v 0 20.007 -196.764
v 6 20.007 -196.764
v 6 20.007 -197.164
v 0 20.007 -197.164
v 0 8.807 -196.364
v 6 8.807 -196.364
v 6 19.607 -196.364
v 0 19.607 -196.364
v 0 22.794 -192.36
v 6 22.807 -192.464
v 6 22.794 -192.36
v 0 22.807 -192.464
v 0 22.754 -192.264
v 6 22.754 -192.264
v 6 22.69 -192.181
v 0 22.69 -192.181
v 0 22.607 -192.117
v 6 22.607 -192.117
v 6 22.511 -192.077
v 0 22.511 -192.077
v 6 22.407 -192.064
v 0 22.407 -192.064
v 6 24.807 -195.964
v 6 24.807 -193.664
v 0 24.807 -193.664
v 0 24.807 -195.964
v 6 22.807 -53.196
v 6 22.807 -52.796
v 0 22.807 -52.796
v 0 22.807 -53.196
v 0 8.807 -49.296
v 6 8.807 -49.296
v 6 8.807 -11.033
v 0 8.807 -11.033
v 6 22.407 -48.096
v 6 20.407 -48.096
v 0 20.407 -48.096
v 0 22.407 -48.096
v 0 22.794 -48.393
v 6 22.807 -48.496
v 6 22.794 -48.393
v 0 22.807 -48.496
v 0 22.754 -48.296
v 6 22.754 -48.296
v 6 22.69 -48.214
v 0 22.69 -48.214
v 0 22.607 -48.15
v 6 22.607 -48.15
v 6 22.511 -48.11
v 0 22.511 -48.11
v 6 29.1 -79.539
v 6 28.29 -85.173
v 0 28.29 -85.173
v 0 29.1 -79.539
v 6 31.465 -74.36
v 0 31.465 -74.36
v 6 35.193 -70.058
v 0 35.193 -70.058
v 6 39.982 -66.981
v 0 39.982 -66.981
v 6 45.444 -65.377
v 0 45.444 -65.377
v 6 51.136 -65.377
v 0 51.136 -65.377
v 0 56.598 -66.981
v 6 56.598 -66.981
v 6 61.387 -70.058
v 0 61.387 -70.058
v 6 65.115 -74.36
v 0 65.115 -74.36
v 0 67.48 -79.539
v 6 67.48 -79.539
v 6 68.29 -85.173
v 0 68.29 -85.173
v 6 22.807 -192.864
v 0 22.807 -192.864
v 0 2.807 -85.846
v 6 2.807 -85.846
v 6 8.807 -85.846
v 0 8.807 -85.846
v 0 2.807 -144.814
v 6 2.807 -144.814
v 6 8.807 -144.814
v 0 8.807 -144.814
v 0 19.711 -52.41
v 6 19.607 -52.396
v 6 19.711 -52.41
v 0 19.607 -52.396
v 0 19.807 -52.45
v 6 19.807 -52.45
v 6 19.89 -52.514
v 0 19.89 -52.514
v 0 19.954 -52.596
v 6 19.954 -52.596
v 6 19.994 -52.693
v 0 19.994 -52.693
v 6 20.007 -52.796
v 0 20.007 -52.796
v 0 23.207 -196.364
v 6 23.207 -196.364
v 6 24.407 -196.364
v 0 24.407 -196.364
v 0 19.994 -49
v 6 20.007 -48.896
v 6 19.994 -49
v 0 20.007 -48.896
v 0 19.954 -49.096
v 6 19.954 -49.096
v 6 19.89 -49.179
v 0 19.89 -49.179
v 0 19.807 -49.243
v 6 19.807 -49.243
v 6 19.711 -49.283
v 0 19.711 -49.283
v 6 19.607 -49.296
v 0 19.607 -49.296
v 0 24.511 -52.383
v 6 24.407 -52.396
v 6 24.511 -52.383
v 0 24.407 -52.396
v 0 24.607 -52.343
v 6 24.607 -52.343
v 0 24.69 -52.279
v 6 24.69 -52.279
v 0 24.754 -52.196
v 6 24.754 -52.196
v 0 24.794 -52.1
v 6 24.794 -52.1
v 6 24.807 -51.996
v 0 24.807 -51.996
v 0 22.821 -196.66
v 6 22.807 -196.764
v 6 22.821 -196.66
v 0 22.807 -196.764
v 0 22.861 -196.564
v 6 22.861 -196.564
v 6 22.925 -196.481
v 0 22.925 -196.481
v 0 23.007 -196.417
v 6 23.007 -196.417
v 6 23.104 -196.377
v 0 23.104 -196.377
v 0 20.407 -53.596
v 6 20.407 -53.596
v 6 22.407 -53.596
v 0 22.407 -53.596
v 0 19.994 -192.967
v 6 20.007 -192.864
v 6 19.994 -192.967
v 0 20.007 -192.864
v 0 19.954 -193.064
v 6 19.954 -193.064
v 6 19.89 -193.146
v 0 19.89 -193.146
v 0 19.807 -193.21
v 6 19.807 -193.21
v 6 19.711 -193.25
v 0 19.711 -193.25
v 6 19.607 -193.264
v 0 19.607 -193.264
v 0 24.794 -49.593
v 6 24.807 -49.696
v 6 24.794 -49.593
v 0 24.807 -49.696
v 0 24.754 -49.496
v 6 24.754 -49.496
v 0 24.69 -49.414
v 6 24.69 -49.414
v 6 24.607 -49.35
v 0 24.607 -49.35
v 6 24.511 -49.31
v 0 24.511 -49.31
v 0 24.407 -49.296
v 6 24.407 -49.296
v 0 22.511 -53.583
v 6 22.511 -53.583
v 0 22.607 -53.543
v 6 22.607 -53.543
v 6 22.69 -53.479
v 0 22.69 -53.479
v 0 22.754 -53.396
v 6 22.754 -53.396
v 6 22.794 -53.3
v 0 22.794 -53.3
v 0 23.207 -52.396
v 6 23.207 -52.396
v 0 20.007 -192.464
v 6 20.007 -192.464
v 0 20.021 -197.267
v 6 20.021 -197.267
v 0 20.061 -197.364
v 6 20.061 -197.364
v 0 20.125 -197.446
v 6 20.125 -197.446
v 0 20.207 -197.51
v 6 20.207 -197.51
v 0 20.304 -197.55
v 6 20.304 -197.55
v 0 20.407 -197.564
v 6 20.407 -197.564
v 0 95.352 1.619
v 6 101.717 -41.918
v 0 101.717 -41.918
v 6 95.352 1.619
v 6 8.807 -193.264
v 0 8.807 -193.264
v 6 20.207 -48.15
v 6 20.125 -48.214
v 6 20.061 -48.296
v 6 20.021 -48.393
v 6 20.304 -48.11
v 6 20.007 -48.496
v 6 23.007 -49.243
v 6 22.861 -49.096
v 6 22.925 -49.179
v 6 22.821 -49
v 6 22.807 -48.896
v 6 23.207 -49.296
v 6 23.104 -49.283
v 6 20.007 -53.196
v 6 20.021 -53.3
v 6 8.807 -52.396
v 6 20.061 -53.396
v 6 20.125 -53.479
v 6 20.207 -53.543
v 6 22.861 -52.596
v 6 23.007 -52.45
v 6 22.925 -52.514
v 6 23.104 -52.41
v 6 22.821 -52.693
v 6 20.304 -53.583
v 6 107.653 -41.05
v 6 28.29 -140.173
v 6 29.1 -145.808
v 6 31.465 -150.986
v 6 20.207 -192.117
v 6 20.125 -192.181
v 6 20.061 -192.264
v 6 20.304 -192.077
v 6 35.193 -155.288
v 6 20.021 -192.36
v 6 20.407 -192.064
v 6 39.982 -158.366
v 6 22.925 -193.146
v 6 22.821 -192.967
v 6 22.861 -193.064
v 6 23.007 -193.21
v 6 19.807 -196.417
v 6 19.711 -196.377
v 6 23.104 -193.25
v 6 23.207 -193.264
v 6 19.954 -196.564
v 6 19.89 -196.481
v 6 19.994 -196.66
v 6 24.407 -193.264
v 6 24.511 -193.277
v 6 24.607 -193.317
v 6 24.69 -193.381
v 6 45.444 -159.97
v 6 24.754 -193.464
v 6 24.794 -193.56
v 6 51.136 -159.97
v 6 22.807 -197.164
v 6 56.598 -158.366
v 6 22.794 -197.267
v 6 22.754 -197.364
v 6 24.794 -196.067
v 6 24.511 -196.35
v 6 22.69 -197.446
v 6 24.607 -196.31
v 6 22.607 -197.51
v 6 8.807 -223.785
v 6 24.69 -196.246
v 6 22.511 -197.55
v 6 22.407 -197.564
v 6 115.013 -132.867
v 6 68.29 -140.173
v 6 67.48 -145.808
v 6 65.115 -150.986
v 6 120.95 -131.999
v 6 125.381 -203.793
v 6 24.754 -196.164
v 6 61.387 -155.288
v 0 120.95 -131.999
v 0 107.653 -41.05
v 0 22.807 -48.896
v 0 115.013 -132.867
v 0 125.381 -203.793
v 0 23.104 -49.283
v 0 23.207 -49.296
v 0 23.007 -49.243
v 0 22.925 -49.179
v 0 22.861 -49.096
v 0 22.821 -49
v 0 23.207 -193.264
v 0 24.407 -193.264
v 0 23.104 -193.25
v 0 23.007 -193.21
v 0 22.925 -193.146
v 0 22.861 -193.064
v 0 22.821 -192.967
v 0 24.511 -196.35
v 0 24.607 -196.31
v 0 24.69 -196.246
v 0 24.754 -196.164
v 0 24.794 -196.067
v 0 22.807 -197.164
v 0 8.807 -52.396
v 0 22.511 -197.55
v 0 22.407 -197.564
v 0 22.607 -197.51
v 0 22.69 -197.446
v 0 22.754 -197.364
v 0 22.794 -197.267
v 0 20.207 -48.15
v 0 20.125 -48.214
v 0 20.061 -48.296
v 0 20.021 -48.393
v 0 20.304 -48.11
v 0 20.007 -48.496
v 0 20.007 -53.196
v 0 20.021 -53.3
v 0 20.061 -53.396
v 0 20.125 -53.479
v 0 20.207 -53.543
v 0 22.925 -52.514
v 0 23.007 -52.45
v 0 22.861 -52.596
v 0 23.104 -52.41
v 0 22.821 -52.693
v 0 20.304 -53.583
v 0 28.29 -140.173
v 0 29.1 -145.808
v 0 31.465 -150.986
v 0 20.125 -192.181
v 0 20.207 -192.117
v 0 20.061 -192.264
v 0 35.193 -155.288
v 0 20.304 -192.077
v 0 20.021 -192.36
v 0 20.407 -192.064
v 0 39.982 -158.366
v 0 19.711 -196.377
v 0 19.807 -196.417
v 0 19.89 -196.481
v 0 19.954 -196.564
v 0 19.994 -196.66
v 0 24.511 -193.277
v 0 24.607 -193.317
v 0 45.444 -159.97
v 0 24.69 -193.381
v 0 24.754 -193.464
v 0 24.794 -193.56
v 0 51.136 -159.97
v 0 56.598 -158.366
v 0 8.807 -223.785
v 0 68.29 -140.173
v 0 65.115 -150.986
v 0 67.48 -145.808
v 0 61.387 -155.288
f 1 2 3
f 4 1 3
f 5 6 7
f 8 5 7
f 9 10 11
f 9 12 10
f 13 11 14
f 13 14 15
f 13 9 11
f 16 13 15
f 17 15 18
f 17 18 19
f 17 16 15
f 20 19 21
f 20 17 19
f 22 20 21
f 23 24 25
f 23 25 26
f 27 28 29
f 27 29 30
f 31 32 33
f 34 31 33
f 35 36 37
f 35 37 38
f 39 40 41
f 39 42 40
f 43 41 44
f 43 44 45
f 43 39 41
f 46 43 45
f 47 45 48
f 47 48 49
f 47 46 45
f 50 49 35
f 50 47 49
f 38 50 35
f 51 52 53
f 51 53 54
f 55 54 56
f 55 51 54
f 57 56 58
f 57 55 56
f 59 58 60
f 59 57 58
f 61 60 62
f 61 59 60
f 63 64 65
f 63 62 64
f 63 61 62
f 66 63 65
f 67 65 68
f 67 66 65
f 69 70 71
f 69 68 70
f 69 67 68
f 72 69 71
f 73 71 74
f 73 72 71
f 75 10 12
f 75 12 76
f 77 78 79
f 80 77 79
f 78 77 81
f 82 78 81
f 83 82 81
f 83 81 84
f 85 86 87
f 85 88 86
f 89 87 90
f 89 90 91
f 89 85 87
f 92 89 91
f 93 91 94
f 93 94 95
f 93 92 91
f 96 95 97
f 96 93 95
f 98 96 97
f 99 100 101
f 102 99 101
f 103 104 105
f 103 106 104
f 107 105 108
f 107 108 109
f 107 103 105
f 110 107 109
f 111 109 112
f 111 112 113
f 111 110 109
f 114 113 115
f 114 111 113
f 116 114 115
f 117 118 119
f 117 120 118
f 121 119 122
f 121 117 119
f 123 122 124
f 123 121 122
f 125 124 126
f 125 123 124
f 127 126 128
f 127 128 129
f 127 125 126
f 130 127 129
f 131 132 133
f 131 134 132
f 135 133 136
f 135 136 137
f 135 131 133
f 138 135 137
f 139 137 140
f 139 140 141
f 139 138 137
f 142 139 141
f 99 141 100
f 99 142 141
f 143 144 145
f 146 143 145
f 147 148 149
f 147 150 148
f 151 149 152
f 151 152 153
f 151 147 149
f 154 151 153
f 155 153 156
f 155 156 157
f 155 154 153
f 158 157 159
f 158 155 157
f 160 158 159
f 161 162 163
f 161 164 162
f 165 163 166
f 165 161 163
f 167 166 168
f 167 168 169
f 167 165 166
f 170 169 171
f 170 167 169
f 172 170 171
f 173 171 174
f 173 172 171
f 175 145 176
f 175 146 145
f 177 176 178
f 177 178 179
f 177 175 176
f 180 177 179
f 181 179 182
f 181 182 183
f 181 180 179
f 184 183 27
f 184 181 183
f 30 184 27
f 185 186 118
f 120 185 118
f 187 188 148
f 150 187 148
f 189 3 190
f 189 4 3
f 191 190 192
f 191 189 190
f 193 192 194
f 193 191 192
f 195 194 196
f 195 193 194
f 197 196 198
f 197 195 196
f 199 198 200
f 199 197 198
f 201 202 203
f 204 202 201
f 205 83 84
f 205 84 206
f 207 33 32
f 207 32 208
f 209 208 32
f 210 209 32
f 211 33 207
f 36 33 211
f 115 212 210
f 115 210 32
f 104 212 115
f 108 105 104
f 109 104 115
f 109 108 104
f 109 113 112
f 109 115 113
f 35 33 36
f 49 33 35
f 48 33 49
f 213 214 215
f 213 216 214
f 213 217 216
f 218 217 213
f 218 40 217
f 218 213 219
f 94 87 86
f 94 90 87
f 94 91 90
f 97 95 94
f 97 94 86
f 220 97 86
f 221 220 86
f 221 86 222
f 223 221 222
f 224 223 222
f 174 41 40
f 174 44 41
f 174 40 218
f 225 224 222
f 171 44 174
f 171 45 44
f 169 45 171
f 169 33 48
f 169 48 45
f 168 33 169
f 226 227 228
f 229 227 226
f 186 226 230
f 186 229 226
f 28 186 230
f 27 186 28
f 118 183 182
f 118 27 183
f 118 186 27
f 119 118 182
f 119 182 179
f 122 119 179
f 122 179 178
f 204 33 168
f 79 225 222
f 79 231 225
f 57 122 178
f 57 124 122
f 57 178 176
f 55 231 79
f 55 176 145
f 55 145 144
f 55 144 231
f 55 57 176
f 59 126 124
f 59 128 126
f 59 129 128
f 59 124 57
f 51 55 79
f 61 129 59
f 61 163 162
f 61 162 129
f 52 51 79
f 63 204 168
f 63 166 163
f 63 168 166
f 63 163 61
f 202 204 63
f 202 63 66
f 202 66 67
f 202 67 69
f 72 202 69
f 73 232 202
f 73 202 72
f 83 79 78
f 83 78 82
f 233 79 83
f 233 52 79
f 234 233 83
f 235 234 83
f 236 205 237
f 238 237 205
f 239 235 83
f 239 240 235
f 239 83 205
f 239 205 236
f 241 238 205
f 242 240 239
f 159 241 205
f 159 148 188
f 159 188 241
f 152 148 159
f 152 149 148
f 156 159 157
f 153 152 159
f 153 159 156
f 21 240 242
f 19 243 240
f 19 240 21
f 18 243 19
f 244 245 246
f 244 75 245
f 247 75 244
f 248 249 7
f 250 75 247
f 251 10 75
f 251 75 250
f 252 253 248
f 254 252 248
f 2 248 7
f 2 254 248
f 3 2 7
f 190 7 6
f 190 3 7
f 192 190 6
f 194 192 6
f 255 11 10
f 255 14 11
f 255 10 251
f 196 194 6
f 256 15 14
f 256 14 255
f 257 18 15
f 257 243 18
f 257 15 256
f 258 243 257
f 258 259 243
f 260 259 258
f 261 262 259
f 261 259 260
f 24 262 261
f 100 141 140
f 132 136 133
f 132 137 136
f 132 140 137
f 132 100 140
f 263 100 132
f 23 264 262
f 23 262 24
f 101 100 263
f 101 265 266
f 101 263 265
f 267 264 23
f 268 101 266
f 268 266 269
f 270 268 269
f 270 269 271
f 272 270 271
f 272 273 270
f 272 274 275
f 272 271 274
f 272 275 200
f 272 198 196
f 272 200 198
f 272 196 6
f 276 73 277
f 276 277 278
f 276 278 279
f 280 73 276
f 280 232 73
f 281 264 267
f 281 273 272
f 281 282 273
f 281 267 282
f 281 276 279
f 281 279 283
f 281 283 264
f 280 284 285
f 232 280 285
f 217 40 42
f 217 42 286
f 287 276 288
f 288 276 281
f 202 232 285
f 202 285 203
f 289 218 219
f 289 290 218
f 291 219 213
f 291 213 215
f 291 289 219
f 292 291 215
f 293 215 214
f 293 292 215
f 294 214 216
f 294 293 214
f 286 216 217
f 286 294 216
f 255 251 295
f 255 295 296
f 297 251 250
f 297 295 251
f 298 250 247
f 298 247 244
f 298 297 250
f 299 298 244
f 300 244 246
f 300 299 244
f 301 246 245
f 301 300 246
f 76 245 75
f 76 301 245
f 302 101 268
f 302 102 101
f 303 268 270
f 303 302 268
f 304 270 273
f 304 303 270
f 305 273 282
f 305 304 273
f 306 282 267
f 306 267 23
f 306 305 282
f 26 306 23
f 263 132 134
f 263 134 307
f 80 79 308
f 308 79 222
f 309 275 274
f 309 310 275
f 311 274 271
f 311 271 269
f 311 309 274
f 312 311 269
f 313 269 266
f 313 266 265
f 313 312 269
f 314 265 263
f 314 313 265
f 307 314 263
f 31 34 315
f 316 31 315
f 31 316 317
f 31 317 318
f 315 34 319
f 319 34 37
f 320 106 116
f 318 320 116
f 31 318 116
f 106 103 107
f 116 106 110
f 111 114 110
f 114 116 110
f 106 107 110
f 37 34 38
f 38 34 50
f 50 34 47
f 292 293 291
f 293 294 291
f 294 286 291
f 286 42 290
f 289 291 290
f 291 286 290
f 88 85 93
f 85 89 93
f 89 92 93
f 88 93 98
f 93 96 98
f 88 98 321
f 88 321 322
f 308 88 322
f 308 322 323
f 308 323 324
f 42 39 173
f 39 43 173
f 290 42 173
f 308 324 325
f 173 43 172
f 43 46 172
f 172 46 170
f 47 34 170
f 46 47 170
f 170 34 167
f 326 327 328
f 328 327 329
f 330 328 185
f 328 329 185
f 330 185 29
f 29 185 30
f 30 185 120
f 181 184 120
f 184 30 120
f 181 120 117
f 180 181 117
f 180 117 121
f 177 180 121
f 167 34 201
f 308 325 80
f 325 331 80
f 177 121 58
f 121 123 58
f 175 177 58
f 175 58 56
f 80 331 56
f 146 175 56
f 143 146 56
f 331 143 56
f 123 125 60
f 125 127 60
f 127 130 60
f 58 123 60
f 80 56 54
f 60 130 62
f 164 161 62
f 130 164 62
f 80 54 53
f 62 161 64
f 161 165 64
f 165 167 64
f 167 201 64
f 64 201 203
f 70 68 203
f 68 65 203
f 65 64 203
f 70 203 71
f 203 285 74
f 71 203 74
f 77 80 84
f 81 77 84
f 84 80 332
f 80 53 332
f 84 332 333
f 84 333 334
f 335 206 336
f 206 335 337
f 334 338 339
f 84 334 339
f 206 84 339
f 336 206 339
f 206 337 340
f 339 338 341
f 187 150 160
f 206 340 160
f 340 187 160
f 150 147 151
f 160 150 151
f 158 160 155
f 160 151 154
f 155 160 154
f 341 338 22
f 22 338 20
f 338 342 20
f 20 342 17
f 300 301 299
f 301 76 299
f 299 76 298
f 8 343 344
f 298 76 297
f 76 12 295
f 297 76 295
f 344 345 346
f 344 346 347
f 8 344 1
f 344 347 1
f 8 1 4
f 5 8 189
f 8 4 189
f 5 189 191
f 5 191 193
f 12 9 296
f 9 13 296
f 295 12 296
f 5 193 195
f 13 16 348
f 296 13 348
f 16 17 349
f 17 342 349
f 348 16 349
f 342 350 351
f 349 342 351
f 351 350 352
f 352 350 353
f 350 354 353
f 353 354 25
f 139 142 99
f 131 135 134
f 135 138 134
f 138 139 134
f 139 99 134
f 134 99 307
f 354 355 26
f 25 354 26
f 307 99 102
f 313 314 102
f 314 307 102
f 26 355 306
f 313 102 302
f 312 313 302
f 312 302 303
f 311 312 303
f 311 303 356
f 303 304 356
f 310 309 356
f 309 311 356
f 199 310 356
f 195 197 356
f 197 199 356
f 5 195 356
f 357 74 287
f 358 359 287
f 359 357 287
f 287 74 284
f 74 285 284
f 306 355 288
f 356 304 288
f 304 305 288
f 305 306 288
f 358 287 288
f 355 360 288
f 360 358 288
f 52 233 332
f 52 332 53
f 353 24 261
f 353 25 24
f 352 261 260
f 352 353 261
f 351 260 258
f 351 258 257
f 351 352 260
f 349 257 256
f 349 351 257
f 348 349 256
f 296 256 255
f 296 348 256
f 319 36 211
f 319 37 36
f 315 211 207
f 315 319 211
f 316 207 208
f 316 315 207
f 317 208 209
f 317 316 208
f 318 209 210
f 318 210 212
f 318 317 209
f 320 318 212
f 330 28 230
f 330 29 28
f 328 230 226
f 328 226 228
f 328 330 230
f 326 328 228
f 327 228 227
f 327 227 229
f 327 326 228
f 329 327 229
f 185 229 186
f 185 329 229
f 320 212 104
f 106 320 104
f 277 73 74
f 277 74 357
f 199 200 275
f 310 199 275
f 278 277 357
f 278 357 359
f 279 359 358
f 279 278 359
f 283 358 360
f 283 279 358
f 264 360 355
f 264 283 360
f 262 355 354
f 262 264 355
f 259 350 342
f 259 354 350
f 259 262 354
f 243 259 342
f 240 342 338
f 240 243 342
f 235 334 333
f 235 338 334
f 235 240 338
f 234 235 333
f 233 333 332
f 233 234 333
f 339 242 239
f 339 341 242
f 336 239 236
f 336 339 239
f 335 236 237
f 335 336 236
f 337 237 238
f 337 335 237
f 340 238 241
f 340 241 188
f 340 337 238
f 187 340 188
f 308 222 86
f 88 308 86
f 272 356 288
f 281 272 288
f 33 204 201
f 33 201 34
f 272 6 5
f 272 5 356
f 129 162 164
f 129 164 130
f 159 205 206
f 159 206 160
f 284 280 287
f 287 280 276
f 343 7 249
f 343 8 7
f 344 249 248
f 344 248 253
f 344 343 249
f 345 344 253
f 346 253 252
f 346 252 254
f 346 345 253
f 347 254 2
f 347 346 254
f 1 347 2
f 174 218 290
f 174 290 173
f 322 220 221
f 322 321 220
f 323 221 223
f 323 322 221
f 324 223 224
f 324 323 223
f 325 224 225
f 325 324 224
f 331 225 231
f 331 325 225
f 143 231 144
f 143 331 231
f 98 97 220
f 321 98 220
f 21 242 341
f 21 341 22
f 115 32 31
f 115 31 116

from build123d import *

# Parameters (mm, degrees)
BOSS_EXTRUDE1_DEPTH = 6
CUT_EXTRUDE1_DEPTH  = 6
CUT_EXTRUDE2_DEPTH  = 6
SKETCH5_W           = 3.1
SKETCH5_H           = 16
CUT_EXTRUDE3_DEPTH  = 257.585419281
SKETCH6_W           = 5.5
SKETCH6_H           = 2.8
CUT_EXTRUDE4_DEPTH  = 257.585419281
FILLET1_R           = 0.4
CUT_EXTRUDE5_DEPTH  = 257.585419281


with BuildPart() as part:
    # Sketch1 → Boss-Extrude1 (new body)
    with BuildSketch(Plane(origin=(0, 0, 0), x_dir=(0, 0, -1), z_dir=(1, 0, 0))):
        Polygon((-8.423886954, 100.420733136), (5.846423254, 2.80742232), (224.813620111, 2.80742232), (203.793040966, 125.38142721), (199.85477244, 130.869460409), align=None)
    extrude(amount=BOSS_EXTRUDE1_DEPTH)

    # Sketch2 → Cut-Extrude1 (cut)
    with BuildSketch(Plane(origin=(6, 0, 0), x_dir=(0, 0, -1), z_dir=(1, 0, 0))):
        Polygon((5.846423254, 2.80742232), (85.846423254, 2.80742232), (85.846423254, 8.80742232), (4.969269713, 8.80742232), align=None)
        Polygon((144.813620111, 2.80742232), (144.813620111, 8.80742232), (223.78466234, 8.80742232), (224.813620111, 2.80742232), align=None)
        Polygon((41.050223347, 107.653464977), (41.918151168, 101.716571741), (-7.555959133, 94.4838399), (-8.423886954, 100.420733136), align=None)
        Polygon((131.999265462, 120.949510704), (132.867193283, 115.012617467), (203.793040966, 125.38142721), (199.85477244, 130.869460409), align=None)
    extrude(amount=-CUT_EXTRUDE1_DEPTH, mode=Mode.SUBTRACT)

    # Sketch4 → Cut-Extrude2 (cut)
    with BuildSketch(Plane(origin=(6, 0, 0), x_dir=(0, 0, -1), z_dir=(1, 0, 0))):
        Polygon((-7.555959133, 94.4838399), (-1.619065897, 95.351767721), (11.033047276, 8.80742232), (4.969269713, 8.80742232), align=None)
    extrude(amount=-CUT_EXTRUDE2_DEPTH, mode=Mode.SUBTRACT)

    # Sketch5 → Cut-Extrude3 (cut, through all)
    with BuildSketch(Plane(origin=(6, 0, 0), x_dir=(0, 0, -1), z_dir=(1, 0, 0))):
        with Locations((50.846423254, 16.80742232)):
            Rectangle(SKETCH5_W, SKETCH5_H)
        with Locations((194.813620111, 16.80742232)):
            Rectangle(SKETCH5_W, SKETCH5_H)
    extrude(amount=-CUT_EXTRUDE3_DEPTH, mode=Mode.SUBTRACT)

    # Sketch6 → Cut-Extrude4 (cut, through all)
    with BuildSketch(Plane(origin=(6, 0, 0), x_dir=(0, 0, -1), z_dir=(1, 0, 0))):
        with Locations((50.846423254, 21.40742232)):
            Rectangle(SKETCH6_W, SKETCH6_H)
        with Locations((194.813620111, 21.40742232)):
            Rectangle(SKETCH6_W, SKETCH6_H)
    extrude(amount=-CUT_EXTRUDE4_DEPTH, mode=Mode.SUBTRACT)

    # Fillet1
    fillet1_edges = [part.edges().sort_by_distance(p)[0] for p in [
        (3, 24.80742232, -193.263620111),
        (3, 24.80742232, -196.363620111),
        (3, 20.00742232, -52.396423254),
        (3, 22.80742232, -52.396423254),
        (3, 20.00742232, -196.363620111),
        (3, 22.80742232, -196.363620111),
        (3, 22.80742232, -49.296423254),
        (3, 22.80742232, -48.096423254),
        (3, 20.00742232, -49.296423254),
        (3, 20.00742232, -53.596423254),
        (3, 20.00742232, -48.096423254),
        (3, 22.80742232, -53.596423254),
        (3, 22.80742232, -193.263620111),
        (3, 22.80742232, -192.063620111),
        (3, 20.00742232, -193.263620111),
        (3, 20.00742232, -197.563620111),
        (3, 20.00742232, -192.063620111),
        (3, 22.80742232, -197.563620111),
        (3, 24.80742232, -49.296423254),
        (3, 24.80742232, -52.396423254),
    ]]
    fillet(fillet1_edges, radius=FILLET1_R)

    # Sketch7 → Cut-Extrude5 (cut, through all)
    with BuildSketch(Plane(origin=(6, 0, 0), x_dir=(0, 0, -1), z_dir=(1, 0, 0))):
        with BuildLine():
            Line((85.173180011, 68.290188576), (140.173180011, 68.290188576))
            ThreePointArc((140.173180011, 68.290188576), (160.173180011, 48.290188576), (140.173180011, 28.290188576))
            Line((140.173180011, 28.290188576), (85.173180011, 28.290188576))
            ThreePointArc((85.173180011, 28.290188576), (65.173180011, 48.290188576), (85.173180011, 68.290188576))
        make_face()
    extrude(amount=-CUT_EXTRUDE5_DEPTH, mode=Mode.SUBTRACT)


solid = part.part
